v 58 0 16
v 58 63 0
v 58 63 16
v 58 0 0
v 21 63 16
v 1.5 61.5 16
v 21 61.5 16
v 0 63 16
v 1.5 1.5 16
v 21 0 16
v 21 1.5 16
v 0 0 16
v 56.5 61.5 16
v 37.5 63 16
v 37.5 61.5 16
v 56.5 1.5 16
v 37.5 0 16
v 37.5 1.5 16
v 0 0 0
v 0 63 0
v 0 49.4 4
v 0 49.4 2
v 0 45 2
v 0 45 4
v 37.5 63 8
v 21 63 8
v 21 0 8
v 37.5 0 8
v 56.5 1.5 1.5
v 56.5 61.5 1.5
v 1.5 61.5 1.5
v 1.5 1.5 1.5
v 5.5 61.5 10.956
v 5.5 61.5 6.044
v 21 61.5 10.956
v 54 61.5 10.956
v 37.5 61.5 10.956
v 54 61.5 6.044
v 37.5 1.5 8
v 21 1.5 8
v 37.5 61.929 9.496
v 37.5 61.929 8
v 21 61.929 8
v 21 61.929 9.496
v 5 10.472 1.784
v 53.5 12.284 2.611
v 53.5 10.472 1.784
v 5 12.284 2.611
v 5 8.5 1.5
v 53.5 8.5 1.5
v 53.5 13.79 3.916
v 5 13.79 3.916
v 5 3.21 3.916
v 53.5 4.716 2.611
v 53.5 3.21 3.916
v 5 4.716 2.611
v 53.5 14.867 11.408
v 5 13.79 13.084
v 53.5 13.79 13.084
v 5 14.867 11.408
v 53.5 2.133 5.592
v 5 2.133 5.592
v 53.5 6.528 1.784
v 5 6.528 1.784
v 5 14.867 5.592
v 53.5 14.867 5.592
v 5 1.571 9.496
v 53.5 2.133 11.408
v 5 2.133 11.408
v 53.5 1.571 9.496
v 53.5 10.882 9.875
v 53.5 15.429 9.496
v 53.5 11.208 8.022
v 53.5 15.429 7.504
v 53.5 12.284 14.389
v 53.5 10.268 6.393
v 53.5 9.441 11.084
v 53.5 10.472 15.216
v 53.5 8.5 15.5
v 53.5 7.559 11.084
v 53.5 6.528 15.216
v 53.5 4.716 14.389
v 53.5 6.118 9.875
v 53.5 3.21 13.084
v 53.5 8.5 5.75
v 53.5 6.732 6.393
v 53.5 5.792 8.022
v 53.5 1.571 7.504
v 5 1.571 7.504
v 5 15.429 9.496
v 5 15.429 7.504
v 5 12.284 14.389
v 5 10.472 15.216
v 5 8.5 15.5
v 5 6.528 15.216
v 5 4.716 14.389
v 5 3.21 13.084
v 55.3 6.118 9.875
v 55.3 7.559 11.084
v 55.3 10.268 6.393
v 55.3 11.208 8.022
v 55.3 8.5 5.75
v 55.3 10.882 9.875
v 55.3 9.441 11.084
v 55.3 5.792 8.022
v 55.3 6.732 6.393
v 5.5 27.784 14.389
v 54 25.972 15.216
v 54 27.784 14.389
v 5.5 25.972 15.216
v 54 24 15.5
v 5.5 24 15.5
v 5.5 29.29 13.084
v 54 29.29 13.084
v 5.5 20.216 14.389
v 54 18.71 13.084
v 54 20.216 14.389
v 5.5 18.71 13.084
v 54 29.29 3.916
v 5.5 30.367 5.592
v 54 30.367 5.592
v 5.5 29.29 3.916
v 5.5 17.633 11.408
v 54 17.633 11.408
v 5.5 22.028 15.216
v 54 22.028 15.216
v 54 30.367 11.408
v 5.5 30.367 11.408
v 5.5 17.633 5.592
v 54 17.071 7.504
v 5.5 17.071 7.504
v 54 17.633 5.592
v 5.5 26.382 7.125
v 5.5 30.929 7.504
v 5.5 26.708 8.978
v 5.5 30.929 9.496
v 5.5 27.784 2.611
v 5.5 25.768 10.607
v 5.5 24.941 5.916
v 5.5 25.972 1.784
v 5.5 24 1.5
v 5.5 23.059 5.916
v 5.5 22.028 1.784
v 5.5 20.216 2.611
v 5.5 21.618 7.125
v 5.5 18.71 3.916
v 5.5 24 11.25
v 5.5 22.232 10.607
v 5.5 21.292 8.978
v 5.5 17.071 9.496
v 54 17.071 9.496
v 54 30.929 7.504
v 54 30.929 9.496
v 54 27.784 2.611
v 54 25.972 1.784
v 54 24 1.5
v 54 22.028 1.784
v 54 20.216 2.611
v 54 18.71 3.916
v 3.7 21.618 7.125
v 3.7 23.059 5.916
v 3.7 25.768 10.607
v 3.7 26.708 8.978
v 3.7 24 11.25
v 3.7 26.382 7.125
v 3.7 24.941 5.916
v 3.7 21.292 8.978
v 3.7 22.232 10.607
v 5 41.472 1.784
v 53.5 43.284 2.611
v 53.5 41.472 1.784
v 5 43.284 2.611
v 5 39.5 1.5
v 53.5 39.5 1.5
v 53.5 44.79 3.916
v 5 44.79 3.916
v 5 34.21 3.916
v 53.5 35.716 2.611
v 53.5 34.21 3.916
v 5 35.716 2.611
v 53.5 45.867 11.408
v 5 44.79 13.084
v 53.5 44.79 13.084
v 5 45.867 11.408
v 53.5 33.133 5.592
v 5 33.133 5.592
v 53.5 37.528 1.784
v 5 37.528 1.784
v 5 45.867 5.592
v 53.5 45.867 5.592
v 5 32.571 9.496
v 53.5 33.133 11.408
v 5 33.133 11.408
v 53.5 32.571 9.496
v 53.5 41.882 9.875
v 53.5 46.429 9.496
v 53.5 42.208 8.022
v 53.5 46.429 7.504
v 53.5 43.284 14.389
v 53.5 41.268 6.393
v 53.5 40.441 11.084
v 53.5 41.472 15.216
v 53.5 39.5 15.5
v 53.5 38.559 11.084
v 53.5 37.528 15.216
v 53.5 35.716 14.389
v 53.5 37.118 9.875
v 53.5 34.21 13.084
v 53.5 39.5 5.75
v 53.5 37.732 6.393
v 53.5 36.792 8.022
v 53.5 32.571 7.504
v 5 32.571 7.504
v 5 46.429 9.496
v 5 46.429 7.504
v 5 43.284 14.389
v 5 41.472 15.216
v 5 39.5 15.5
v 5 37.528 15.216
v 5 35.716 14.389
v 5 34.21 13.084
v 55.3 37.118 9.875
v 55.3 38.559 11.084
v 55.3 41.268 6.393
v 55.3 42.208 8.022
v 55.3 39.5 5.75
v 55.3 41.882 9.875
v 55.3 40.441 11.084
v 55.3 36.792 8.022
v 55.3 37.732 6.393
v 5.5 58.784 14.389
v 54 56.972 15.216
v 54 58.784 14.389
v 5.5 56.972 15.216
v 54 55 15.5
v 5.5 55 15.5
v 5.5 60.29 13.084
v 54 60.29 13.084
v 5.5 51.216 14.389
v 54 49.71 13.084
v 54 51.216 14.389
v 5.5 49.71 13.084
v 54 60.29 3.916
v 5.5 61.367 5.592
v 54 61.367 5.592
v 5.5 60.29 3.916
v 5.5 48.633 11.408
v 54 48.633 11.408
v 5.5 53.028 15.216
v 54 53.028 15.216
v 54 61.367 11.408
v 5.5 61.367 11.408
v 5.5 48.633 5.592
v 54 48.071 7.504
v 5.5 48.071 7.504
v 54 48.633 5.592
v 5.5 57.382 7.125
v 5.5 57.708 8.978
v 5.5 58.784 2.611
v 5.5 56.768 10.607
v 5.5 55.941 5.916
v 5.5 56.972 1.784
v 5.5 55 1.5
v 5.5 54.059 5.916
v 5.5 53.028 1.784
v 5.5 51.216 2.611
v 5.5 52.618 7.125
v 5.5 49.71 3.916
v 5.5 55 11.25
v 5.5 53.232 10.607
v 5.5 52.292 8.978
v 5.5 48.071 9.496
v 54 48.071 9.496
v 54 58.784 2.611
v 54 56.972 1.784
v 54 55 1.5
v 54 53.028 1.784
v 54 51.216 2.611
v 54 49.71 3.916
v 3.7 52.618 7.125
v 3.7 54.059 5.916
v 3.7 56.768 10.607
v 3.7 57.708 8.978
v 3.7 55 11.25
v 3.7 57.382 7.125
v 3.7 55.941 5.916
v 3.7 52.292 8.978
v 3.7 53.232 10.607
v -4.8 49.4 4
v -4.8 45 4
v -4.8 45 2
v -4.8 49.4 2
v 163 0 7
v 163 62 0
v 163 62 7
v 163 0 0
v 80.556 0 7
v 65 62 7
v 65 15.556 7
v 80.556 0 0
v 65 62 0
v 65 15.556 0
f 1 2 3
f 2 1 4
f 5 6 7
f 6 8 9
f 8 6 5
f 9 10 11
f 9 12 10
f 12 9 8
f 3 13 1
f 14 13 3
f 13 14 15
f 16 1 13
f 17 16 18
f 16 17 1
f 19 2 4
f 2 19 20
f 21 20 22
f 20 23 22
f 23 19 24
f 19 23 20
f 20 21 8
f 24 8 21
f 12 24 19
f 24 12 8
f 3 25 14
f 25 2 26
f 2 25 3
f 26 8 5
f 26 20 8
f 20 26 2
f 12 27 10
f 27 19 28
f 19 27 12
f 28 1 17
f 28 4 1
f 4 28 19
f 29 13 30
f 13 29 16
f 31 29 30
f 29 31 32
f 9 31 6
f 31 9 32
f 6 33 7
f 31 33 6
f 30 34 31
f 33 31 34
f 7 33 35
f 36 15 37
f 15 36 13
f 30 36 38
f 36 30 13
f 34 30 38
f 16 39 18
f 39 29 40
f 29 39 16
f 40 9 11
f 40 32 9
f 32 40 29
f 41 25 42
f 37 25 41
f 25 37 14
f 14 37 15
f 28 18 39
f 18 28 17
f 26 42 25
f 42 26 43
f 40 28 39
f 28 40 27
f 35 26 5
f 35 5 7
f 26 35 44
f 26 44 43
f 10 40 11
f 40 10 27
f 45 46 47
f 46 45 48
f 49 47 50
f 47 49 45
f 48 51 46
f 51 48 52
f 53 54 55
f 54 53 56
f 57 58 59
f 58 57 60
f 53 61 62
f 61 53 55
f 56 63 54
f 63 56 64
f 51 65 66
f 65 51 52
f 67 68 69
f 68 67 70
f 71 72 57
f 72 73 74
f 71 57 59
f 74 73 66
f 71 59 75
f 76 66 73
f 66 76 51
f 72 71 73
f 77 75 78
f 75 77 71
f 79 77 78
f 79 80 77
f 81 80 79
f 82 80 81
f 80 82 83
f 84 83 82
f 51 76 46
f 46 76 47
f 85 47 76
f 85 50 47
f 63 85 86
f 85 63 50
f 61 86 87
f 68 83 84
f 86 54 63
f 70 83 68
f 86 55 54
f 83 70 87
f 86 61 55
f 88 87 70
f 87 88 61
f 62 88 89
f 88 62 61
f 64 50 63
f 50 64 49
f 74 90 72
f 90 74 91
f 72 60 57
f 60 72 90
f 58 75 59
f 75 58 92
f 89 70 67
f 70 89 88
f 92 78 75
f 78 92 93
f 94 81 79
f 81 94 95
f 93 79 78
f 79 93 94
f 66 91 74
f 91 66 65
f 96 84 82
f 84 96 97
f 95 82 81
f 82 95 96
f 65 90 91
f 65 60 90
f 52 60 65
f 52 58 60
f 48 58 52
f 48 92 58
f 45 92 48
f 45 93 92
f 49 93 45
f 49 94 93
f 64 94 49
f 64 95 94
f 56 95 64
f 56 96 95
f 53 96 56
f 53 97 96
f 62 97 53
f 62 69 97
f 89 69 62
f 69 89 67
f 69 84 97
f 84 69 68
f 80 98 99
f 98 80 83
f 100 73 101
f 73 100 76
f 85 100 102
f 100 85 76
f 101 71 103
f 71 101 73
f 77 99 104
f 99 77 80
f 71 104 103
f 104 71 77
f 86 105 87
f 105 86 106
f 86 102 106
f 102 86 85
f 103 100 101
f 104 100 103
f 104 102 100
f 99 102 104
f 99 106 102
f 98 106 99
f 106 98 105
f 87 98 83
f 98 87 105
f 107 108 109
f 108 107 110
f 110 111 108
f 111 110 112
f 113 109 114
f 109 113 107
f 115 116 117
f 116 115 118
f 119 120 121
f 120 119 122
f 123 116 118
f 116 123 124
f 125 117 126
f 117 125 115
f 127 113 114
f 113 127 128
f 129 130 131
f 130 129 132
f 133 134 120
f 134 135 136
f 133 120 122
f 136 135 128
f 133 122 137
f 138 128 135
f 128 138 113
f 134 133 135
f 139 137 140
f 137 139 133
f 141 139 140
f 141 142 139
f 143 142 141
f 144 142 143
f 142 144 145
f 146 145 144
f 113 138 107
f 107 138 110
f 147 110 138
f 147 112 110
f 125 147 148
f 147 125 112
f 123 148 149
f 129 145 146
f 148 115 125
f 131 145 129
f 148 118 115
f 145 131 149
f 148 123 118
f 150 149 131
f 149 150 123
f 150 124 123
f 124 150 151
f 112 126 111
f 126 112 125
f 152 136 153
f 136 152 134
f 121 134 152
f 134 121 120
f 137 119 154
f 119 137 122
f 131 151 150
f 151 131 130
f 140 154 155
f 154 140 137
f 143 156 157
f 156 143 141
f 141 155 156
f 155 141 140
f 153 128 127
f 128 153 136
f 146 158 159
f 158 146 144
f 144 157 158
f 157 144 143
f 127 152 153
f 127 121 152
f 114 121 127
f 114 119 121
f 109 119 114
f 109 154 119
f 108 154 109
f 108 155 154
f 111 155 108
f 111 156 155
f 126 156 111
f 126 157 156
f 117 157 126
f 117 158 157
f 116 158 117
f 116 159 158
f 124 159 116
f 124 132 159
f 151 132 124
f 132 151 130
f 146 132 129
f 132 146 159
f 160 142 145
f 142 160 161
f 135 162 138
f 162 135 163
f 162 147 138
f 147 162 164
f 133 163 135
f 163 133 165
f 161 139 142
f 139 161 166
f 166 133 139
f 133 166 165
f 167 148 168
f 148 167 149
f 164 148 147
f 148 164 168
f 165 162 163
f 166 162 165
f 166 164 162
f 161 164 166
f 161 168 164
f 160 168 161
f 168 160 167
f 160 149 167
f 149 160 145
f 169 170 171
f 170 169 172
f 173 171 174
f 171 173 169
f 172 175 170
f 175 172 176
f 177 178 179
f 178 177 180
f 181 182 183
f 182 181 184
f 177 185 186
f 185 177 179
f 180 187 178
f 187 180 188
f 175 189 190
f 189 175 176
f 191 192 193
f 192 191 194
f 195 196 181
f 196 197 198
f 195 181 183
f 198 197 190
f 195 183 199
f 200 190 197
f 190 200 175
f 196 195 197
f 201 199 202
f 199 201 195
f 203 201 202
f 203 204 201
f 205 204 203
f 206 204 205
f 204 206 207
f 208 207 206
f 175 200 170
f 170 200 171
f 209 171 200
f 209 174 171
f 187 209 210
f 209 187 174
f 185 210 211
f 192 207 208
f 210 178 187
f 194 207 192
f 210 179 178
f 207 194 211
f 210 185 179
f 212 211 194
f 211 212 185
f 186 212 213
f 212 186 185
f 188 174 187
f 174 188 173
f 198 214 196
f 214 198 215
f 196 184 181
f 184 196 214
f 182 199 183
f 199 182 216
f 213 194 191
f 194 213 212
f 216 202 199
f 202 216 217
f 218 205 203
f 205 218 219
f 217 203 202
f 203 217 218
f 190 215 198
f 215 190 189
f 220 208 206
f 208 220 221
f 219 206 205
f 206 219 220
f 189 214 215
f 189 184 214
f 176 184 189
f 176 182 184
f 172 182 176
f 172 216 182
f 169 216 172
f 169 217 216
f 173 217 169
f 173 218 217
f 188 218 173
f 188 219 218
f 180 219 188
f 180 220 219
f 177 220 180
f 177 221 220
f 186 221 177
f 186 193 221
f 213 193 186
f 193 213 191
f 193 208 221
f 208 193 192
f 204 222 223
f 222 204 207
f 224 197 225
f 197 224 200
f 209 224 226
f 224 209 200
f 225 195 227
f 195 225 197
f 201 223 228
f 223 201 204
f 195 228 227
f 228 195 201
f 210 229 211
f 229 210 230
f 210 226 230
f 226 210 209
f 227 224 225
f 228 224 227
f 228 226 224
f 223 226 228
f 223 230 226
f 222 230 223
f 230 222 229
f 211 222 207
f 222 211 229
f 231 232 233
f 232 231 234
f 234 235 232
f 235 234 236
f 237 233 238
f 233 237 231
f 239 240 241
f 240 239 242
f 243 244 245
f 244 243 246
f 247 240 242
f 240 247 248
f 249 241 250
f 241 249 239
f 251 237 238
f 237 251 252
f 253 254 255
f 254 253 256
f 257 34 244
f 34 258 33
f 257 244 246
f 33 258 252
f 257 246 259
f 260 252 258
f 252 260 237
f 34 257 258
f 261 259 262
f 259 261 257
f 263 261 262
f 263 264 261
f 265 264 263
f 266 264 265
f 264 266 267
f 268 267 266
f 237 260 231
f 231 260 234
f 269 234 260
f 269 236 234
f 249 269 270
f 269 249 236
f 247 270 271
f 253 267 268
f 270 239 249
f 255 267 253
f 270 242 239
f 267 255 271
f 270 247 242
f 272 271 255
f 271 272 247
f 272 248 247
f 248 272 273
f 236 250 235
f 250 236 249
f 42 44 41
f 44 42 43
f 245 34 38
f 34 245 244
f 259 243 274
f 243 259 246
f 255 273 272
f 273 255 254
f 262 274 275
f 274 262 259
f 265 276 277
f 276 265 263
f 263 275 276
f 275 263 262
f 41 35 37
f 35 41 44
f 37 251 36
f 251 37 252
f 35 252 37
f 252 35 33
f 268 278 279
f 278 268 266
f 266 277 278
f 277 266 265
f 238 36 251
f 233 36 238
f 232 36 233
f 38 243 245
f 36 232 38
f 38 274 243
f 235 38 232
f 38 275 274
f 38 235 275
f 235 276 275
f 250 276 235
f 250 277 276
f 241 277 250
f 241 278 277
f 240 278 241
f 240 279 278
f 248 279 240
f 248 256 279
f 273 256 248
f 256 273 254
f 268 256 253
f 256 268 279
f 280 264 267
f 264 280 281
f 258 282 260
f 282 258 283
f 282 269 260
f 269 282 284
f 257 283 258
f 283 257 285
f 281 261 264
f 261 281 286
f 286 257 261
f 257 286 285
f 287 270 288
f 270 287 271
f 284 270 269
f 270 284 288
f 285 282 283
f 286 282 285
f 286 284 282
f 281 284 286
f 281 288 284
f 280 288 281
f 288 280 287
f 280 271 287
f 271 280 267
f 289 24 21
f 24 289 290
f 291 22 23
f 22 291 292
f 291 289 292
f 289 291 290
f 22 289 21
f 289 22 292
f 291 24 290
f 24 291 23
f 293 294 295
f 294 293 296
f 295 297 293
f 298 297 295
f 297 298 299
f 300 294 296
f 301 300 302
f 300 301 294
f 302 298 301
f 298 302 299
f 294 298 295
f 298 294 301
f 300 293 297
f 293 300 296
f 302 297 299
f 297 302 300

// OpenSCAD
function aa4BatteryHolderSize() = [58,63,16];
function pb2sBatterySize() = [98,62,7];

module aaBattery() {
  cylinder(d=14, h=48.5);
  cylinder(d=5.5, h=50.3);
}

module aa4BatteryHolder() {
  d = aa4BatteryHolderSize();
  difference() {
    cube(d);
    translate([1.5,1.5,1.5]) cube([55, 60, 14.5]);
    translate([21,0,8]) cube([16.5,d[1],8]);
  }
  
  translate([5, 8.5,8.5]) rotate([0,90,0]) aaBattery();
  translate([54,8.5+15.5,8.5]) rotate([0,-90,0]) aaBattery();
  translate([5, 8.5+31,8.5]) rotate([0,90,0]) aaBattery();
  translate([54,8.5+46.5,8.5]) rotate([0,-90,0]) aaBattery();
  
  translate([-4.8, 45, 2]) cube([4.8,4.4,2]);
}

module pb2sBattery() {
  d = pb2sBatterySize();
  difference() {
    cube(d);
    translate([-13, 13, 0]) rotate([0,0,-45]) cube([30,11,7]);
  }
}

//aaBattery();
aa4BatteryHolder();
translate ([65, 0, 0]) pb2sBattery();
